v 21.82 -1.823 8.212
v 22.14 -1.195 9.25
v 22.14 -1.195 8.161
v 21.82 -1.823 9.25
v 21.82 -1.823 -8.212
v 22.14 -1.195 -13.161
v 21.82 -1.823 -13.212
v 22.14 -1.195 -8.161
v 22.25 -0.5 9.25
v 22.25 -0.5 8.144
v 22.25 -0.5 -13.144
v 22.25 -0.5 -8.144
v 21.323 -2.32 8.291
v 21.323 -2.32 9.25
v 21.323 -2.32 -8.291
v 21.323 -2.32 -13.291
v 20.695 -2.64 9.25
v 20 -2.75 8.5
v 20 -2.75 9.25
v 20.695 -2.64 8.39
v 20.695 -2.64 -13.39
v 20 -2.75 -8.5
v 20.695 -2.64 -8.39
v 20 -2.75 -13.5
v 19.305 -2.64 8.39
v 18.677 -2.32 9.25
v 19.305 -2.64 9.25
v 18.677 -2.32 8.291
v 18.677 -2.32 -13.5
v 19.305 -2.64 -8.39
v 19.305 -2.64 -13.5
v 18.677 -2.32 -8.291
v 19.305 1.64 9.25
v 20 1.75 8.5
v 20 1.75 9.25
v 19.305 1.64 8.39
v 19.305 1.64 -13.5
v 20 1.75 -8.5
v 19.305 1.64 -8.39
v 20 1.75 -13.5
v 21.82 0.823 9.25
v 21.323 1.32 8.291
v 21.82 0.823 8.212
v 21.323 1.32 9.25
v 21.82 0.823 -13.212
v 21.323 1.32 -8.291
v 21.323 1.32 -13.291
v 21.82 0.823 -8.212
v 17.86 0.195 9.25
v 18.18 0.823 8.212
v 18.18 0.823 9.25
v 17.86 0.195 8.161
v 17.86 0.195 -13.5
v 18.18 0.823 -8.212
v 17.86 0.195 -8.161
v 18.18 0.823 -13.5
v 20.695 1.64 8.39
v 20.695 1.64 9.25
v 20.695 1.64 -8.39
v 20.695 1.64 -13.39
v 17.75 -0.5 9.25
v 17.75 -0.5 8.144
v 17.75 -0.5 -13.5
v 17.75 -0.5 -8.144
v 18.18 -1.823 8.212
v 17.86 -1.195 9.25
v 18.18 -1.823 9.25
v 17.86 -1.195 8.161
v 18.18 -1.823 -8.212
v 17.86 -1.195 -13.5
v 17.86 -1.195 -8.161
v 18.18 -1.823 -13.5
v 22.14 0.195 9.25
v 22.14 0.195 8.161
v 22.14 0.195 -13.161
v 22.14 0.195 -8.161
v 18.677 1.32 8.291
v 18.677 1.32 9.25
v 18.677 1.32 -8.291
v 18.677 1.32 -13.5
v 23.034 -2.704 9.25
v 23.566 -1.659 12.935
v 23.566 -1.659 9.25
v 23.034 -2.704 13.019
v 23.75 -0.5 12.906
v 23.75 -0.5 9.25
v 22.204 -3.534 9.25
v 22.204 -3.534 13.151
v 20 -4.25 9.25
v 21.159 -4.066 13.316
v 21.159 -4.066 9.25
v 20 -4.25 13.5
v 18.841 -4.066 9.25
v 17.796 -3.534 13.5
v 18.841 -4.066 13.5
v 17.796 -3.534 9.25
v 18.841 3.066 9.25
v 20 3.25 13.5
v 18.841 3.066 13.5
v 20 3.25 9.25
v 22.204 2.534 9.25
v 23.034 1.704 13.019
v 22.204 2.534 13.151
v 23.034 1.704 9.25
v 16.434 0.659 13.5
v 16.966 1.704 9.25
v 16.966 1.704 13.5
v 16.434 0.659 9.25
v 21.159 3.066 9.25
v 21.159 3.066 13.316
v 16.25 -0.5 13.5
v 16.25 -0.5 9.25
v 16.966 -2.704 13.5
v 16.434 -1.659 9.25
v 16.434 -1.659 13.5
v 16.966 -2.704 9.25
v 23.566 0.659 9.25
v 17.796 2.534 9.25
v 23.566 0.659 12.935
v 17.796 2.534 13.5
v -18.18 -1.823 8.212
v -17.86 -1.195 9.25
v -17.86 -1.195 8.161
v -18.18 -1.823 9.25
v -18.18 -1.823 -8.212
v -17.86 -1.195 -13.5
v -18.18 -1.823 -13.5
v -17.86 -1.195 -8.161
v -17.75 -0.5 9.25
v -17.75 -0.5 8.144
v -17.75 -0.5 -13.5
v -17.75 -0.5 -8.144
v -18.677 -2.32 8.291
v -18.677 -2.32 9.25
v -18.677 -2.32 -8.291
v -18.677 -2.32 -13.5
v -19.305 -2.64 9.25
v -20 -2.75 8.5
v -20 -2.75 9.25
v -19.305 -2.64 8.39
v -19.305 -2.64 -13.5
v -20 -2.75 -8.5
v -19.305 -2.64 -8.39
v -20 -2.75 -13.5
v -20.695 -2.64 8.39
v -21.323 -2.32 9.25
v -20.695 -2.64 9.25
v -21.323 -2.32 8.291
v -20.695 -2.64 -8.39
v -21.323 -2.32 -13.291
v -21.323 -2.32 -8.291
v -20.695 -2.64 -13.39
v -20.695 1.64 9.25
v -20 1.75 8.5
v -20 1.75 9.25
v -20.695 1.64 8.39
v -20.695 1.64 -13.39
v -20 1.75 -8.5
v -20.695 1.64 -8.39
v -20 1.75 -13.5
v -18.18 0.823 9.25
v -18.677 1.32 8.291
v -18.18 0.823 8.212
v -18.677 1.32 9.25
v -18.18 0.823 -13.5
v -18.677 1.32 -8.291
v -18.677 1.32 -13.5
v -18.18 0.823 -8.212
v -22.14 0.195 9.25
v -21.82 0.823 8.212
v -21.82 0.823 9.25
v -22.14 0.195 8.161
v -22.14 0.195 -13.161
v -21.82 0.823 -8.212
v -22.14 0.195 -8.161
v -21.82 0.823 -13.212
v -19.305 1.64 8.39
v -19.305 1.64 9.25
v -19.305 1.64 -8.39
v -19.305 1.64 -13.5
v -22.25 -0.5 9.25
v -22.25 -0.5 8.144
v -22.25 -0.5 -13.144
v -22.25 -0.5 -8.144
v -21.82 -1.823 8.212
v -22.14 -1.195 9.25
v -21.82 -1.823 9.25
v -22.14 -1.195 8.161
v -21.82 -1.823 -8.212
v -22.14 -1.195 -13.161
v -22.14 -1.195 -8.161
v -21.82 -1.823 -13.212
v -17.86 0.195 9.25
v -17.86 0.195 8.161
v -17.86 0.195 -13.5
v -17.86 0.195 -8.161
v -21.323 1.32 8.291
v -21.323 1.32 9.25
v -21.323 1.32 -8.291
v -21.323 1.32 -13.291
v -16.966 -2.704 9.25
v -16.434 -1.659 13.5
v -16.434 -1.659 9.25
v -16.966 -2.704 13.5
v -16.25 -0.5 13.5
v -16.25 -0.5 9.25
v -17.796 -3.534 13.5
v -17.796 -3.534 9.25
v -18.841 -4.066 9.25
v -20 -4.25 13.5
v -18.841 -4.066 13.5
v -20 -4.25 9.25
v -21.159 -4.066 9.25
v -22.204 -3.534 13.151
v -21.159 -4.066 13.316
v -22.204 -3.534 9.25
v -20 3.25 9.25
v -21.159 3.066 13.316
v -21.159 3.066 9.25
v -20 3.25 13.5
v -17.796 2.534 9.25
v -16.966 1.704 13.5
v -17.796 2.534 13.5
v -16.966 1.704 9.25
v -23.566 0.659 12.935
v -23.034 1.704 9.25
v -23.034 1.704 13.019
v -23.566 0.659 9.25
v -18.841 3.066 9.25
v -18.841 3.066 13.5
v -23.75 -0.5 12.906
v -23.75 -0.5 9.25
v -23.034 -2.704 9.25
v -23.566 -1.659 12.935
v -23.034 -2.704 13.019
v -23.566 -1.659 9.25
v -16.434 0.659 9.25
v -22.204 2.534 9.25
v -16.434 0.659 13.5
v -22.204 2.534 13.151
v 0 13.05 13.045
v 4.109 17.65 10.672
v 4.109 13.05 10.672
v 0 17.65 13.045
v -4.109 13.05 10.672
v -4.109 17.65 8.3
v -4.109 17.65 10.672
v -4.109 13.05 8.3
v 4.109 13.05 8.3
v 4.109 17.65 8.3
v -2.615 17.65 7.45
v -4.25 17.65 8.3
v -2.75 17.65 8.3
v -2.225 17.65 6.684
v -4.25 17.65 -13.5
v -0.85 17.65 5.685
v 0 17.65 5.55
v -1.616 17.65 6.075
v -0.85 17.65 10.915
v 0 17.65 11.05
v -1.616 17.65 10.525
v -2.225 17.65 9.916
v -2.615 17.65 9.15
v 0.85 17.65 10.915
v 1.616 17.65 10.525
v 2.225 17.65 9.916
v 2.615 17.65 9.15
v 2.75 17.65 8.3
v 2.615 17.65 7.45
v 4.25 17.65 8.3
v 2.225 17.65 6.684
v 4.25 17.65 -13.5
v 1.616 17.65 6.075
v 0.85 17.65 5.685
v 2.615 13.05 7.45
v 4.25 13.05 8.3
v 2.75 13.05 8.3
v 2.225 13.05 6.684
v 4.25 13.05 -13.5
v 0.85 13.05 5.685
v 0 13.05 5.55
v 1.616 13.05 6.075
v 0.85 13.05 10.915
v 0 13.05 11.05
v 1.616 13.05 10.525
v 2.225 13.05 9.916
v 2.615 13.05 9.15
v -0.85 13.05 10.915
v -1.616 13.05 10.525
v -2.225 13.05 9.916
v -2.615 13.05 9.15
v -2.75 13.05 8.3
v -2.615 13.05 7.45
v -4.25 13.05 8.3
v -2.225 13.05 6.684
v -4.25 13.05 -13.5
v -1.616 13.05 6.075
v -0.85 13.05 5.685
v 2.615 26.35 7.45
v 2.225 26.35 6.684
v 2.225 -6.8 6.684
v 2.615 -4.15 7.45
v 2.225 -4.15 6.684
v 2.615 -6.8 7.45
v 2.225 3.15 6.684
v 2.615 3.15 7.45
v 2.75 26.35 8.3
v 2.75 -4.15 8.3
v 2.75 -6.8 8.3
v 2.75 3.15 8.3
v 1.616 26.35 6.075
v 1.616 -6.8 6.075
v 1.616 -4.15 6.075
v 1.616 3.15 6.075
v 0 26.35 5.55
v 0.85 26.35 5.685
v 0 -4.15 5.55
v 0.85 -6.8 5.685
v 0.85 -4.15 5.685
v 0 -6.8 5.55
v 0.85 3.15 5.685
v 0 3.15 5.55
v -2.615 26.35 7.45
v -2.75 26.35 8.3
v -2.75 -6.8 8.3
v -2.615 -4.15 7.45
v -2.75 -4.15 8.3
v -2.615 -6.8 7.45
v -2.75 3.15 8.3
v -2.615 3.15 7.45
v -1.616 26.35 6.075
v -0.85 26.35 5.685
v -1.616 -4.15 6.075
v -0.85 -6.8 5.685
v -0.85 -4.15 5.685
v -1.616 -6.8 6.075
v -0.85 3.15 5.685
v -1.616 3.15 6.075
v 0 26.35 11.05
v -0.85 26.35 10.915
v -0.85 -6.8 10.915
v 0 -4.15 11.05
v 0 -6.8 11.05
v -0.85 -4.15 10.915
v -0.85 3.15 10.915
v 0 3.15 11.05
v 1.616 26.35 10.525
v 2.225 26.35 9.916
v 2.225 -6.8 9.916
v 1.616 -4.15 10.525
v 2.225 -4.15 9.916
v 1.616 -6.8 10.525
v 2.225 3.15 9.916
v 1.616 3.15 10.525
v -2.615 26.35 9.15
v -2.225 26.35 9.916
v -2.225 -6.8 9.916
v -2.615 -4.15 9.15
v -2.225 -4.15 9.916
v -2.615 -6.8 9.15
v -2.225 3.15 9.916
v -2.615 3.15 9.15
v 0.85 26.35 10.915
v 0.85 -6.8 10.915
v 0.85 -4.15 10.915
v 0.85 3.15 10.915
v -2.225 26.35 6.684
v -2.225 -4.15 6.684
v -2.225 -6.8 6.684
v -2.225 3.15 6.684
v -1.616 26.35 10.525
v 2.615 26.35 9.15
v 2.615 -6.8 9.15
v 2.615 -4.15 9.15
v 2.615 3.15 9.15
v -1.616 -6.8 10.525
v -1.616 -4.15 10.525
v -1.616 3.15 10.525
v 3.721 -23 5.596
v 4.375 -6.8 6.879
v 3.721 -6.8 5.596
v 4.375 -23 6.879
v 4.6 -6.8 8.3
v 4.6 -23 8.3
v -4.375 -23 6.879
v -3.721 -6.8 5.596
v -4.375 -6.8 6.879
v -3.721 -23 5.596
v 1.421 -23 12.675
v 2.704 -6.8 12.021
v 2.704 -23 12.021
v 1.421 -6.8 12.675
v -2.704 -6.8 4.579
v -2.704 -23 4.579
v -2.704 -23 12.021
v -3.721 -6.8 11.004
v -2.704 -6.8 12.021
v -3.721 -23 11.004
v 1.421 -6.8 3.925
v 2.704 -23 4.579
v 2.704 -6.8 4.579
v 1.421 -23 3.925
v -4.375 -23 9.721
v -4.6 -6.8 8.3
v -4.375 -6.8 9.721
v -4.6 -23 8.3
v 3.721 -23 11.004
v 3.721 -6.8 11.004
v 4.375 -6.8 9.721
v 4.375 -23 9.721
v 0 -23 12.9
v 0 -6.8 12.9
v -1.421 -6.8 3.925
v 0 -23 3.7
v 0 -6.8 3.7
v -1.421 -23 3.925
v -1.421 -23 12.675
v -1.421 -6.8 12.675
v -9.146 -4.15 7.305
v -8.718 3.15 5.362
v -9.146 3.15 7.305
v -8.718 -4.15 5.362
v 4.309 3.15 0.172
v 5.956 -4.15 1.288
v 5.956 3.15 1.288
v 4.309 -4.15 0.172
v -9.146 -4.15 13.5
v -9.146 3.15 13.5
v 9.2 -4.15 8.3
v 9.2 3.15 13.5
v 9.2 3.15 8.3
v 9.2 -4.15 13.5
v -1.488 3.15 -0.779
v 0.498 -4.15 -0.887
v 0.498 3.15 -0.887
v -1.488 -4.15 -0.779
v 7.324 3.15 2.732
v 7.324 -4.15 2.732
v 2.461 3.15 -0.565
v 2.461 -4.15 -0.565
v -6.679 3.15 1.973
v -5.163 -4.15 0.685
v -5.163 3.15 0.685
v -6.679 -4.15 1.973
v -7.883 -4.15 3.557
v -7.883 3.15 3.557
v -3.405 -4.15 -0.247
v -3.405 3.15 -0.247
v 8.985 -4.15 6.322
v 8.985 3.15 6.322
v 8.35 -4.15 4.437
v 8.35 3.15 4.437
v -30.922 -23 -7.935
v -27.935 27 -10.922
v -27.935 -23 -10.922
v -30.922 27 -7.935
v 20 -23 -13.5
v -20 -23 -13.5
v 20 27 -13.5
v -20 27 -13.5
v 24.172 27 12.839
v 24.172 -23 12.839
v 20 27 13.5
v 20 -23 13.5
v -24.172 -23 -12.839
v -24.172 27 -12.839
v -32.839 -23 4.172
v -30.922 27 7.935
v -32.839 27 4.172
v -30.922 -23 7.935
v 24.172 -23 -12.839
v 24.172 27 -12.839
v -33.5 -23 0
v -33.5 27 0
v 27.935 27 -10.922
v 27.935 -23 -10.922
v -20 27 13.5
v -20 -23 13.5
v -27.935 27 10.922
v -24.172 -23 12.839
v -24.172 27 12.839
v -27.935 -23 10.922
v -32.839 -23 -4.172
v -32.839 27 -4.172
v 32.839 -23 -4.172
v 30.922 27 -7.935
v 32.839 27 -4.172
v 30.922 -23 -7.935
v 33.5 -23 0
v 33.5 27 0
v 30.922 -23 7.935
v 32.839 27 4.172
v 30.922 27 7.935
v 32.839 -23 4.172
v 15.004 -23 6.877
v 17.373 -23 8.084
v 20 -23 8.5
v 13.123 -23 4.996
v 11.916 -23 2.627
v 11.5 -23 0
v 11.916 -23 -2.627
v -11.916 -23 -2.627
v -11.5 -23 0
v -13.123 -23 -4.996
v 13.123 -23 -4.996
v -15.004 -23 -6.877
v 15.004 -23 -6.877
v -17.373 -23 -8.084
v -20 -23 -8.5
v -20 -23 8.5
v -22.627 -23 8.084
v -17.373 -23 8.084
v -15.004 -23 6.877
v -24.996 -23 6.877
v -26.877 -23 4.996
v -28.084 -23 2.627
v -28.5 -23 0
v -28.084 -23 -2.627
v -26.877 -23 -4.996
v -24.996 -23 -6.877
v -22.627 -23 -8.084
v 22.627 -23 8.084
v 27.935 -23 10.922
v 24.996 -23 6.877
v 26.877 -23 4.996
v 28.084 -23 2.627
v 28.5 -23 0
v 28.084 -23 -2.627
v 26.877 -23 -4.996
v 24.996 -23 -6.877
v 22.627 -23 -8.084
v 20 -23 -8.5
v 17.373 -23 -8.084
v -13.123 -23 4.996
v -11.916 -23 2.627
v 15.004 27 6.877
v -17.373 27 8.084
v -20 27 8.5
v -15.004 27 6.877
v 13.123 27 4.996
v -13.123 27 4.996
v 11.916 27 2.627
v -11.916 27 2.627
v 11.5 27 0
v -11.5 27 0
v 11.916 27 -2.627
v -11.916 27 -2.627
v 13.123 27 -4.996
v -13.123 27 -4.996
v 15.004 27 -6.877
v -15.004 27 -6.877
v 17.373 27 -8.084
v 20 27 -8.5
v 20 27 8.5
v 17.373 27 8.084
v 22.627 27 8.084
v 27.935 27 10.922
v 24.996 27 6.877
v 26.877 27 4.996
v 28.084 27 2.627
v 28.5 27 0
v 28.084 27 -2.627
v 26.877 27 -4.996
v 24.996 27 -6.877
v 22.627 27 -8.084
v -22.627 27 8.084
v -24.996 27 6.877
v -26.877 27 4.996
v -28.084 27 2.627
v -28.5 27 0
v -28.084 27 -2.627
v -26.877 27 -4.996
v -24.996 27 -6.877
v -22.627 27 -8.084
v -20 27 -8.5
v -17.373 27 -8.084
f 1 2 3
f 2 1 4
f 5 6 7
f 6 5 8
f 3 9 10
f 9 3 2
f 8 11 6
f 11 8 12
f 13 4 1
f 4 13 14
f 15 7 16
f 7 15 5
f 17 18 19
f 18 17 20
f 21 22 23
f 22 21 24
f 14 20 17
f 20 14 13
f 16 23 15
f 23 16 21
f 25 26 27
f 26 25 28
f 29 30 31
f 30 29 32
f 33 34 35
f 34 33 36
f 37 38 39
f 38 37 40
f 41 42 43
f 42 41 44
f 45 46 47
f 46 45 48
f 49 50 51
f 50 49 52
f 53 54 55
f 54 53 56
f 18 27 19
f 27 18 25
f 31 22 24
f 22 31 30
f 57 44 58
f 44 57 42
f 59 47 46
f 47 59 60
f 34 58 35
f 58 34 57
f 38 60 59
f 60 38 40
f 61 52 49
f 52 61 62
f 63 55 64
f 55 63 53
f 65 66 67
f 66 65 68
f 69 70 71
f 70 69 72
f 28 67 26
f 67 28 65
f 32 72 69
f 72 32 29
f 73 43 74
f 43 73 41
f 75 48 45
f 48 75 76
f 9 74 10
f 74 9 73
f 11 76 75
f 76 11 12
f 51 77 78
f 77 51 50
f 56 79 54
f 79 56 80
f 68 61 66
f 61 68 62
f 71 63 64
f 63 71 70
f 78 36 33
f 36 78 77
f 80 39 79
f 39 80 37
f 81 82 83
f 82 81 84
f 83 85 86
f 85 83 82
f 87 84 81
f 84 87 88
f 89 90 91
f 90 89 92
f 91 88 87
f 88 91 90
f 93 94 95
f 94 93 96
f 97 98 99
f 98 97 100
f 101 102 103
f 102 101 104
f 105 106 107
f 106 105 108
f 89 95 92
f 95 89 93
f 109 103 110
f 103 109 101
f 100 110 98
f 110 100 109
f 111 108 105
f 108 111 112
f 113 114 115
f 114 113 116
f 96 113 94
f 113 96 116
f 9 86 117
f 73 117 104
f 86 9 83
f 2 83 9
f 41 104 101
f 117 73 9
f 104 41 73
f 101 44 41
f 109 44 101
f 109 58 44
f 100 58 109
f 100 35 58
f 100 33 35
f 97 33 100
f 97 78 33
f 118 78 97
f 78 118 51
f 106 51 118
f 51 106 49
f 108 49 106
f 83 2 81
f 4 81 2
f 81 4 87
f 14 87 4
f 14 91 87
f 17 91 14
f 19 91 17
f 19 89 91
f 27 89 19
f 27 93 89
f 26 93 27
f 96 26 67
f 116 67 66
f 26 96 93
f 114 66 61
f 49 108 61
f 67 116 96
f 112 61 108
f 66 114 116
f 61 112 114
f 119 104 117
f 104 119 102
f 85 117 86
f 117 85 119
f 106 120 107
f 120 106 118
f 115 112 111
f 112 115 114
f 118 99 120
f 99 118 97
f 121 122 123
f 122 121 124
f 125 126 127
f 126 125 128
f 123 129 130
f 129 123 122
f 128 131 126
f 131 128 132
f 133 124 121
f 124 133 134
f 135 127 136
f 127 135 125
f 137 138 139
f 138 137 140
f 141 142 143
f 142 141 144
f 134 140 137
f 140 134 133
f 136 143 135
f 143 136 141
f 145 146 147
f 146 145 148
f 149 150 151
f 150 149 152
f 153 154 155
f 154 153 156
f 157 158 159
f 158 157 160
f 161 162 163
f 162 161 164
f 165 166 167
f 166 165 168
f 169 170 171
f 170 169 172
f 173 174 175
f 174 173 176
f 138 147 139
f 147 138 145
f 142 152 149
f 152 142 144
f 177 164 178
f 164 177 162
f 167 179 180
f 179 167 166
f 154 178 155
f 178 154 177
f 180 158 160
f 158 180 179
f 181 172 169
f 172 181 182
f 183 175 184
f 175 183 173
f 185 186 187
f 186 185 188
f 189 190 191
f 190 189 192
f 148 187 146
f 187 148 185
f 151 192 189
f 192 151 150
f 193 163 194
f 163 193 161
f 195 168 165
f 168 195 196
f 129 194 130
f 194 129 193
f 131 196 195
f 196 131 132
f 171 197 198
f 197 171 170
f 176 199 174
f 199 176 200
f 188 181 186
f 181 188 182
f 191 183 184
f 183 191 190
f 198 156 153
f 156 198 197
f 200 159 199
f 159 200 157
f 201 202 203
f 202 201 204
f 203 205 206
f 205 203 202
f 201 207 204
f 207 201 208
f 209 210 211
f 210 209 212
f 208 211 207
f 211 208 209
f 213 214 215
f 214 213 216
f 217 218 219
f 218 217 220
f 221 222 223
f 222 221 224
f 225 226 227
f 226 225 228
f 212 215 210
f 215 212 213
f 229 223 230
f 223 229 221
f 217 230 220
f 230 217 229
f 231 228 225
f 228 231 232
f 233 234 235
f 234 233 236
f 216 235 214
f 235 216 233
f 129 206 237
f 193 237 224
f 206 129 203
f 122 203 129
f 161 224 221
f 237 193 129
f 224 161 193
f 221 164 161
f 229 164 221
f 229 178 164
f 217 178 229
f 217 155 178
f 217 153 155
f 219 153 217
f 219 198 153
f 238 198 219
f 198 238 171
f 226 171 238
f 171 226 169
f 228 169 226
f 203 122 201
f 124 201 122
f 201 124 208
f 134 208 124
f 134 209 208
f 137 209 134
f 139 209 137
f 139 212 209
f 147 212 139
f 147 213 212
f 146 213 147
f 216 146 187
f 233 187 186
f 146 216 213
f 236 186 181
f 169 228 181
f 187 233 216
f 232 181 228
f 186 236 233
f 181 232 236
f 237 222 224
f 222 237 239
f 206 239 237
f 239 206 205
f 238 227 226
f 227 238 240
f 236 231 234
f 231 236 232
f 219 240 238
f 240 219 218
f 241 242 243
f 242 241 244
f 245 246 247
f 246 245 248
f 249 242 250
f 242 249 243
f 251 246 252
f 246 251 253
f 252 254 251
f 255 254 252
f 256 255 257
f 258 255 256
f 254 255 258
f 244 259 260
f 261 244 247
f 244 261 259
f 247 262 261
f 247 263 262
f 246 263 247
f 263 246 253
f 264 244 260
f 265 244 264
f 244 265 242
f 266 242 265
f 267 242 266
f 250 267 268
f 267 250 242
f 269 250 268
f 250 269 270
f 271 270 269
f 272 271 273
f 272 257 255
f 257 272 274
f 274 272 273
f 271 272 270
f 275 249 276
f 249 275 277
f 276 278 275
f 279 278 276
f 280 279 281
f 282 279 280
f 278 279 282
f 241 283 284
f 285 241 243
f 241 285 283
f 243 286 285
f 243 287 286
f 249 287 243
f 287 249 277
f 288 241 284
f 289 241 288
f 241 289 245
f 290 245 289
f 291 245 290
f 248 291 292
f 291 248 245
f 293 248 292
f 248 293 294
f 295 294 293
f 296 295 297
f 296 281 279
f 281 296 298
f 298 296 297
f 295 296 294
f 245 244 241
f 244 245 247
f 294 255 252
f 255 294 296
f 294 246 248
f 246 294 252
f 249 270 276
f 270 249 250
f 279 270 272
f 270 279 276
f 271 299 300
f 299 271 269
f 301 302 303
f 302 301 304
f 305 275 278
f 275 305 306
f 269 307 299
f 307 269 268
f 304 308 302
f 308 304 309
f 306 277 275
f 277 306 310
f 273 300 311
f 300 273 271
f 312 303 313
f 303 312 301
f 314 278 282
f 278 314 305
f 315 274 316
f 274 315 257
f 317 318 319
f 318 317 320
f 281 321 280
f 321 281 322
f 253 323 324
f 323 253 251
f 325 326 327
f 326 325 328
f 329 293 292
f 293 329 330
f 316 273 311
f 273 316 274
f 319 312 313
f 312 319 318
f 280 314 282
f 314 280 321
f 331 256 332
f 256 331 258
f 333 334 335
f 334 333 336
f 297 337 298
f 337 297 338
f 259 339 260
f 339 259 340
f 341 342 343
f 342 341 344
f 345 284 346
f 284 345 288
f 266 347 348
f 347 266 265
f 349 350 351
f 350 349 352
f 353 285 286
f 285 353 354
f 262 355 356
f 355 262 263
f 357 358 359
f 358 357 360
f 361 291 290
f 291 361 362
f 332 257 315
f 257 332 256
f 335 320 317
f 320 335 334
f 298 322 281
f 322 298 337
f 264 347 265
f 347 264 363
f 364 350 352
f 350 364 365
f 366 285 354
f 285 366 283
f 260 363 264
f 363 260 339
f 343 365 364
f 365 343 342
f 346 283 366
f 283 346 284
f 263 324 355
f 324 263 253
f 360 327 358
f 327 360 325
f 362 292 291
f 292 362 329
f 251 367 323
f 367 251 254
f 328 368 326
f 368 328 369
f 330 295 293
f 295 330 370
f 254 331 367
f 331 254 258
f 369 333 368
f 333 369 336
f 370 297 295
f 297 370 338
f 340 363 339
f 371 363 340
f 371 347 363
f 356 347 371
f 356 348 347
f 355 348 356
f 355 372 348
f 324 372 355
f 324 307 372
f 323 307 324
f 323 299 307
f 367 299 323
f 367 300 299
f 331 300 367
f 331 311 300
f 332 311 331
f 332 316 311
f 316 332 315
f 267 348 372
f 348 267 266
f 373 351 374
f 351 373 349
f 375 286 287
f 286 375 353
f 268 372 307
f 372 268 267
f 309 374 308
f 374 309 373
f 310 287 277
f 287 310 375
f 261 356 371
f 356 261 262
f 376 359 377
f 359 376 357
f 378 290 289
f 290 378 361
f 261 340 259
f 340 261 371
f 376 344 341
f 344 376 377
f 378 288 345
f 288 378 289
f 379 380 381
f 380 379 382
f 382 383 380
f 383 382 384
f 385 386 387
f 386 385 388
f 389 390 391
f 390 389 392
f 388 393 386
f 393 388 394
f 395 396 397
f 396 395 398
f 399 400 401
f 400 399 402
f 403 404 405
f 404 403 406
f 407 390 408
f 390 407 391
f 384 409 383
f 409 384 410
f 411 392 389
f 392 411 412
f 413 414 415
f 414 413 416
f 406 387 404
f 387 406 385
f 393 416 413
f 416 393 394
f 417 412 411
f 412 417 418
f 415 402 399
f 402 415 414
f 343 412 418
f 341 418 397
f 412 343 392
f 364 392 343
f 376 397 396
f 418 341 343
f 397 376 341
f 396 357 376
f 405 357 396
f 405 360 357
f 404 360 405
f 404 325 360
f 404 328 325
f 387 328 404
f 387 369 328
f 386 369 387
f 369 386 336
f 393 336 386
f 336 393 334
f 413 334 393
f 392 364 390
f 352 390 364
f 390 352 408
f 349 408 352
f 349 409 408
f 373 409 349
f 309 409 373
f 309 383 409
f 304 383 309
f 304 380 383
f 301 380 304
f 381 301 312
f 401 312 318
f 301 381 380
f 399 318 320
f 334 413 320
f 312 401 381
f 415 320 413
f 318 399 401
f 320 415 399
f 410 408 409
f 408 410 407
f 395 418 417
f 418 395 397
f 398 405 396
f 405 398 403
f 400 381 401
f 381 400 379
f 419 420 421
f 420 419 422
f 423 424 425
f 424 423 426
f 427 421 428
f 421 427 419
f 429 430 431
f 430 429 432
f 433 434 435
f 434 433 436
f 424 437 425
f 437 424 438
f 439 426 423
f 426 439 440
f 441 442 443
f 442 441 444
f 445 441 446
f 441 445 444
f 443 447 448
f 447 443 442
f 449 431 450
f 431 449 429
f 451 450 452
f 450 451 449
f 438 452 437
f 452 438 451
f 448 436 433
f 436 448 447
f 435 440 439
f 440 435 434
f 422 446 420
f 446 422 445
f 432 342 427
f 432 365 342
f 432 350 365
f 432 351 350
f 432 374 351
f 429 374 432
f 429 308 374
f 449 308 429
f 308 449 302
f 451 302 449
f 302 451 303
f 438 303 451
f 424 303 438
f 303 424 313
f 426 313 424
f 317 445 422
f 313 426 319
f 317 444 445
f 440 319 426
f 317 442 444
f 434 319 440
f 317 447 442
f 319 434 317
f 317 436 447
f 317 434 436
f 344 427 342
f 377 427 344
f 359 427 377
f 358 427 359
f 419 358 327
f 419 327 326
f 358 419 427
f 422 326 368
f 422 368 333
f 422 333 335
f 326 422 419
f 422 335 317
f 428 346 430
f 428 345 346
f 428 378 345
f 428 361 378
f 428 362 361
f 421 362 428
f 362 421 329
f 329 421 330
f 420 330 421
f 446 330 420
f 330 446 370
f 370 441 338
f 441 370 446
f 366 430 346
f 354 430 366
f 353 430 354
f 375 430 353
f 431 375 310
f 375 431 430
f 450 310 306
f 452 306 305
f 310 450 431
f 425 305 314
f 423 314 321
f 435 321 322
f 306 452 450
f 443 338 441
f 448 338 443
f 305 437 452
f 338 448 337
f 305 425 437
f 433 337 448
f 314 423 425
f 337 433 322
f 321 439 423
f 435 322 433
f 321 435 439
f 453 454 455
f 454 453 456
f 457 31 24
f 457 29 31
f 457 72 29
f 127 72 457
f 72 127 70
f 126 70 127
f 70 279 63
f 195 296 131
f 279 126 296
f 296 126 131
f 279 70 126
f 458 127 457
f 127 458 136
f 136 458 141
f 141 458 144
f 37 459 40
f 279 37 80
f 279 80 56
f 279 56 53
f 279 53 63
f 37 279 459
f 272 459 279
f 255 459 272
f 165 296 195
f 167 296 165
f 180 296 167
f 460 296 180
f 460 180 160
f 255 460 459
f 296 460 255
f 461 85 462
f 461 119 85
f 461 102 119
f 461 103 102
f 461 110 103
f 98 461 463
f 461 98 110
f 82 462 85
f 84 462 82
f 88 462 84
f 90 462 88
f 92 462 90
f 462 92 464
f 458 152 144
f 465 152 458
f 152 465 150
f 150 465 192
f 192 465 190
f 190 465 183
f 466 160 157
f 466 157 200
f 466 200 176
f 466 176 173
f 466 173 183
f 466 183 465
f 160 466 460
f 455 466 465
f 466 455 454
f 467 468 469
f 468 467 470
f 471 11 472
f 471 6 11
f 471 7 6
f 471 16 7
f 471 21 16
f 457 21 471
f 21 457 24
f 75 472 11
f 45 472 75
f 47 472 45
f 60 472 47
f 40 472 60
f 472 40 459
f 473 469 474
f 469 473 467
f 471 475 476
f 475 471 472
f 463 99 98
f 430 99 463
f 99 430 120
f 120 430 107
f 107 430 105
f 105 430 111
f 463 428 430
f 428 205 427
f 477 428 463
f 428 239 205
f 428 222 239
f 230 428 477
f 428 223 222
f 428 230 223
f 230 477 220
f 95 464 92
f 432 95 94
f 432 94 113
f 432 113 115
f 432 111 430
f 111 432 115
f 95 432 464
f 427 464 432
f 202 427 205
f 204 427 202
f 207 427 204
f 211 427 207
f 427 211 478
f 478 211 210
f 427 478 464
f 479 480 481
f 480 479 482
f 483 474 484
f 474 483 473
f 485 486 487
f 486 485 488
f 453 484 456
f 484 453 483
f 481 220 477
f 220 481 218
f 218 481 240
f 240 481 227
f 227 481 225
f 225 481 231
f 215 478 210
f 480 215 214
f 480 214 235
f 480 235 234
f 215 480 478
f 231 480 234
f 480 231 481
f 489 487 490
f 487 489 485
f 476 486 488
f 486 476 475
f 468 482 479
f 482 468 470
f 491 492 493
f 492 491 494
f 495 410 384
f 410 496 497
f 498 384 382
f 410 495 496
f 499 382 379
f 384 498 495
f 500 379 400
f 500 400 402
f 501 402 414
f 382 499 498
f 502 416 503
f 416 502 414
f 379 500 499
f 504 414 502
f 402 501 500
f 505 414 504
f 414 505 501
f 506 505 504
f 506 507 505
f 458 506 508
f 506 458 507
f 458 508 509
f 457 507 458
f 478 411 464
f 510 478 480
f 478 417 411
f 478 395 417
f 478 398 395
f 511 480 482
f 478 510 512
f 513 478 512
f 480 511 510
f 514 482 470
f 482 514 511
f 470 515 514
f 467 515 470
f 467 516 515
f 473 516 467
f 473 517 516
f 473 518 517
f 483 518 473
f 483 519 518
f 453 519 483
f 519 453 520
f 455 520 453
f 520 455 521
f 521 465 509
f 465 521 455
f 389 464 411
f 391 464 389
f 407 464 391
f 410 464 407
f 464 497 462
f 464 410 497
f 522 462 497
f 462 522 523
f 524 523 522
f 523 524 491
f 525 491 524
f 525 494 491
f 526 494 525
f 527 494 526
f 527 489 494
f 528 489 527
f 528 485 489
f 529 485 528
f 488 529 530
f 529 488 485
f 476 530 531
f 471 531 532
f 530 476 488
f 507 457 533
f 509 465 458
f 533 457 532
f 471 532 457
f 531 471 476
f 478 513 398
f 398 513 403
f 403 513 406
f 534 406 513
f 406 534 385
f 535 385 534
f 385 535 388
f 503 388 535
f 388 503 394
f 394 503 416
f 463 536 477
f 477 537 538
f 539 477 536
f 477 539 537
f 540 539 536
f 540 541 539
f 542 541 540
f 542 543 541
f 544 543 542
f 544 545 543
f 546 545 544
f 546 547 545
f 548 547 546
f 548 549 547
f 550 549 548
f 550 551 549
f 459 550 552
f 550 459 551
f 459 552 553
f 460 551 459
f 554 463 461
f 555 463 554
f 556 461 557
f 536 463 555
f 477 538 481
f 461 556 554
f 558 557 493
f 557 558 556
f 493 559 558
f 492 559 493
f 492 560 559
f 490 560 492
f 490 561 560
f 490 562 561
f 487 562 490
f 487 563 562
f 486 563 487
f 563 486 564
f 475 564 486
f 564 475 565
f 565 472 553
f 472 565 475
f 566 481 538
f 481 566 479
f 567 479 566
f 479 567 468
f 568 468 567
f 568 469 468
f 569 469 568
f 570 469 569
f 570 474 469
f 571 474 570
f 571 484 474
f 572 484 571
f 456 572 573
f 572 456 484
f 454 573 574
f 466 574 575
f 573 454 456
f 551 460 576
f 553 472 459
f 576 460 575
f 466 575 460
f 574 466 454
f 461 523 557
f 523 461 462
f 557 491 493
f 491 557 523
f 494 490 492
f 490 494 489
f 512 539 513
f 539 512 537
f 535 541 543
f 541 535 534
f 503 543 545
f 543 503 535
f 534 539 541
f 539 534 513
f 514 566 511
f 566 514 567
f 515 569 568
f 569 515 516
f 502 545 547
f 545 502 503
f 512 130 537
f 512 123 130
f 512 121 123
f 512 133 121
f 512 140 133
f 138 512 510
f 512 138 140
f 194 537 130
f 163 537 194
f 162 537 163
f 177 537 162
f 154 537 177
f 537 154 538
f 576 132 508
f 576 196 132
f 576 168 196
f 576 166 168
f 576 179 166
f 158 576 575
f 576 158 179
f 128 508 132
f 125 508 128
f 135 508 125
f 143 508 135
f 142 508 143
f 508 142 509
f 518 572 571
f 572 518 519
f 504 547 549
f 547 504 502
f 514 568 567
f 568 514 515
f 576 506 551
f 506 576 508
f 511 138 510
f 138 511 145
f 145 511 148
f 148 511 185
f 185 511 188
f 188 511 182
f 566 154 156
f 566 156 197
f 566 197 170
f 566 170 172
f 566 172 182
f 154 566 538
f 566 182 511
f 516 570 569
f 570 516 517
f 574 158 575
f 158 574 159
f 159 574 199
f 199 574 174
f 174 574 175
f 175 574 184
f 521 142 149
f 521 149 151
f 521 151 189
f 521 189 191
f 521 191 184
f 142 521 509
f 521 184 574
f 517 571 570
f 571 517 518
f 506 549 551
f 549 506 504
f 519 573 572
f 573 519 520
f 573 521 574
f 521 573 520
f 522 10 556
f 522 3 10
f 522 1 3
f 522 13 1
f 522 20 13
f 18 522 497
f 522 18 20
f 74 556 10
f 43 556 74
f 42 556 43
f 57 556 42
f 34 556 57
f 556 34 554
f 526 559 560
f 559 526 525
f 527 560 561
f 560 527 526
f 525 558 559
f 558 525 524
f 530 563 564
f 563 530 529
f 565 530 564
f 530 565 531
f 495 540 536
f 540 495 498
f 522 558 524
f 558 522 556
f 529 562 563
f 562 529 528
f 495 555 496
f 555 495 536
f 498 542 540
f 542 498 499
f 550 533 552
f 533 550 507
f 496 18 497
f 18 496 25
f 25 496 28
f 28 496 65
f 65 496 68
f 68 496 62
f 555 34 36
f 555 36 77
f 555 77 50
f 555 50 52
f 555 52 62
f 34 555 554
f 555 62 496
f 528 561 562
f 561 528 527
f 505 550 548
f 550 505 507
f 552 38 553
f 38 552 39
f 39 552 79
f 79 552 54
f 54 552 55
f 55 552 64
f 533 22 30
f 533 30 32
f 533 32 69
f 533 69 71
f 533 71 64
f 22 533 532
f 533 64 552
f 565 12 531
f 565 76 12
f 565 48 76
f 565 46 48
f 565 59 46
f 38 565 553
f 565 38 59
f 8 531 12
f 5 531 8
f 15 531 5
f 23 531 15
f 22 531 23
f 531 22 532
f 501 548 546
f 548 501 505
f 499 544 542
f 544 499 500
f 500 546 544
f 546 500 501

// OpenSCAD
translate(v = [0, 27.0000000000, 0]) {
	rotate(a = [90, 0, 0]) {
		difference() {
			hull() {
				union() {
					translate(v = [-20.0000000000, 0, 0]) {
						cylinder($fn = 20, d = 27.0000000000, h = 50);
					}
					translate(v = [20.0000000000, 0, 0]) {
						cylinder($fn = 20, d = 27.0000000000, h = 50);
					}
				}
			}
			translate(v = [-20.0000000000, 0, -0.0500000000]) {
				cylinder($fn = 20, d = 17.0000000000, h = 50.1000000000);
			}
			translate(v = [20.0000000000, 0, -0.0500000000]) {
				cylinder($fn = 20, d = 17.0000000000, h = 50.1000000000);
			}
			translate(v = [20.0000000000, 13.5000000000, 27.5000000000]) {
				rotate(a = [90, 0, 0]) {
					translate(v = [0, 0, 4.2000000000]) {
						union() {
							translate(v = [0, 0, false]) {
								cylinder($fn = 20, d = 4.5000000000, h = 49.2000000000);
							}
							translate(v = [0, 0, -14.1500000000]) {
								cylinder($fn = 20, d = 7.5000000000, h = 14.2000000000);
							}
							translate(v = [0, 0, 31]) {
								cylinder($fn = 6, d = 8.1600000000, h = 10);
							}
						}
					}
				}
			}
			translate(v = [-20.0000000000, 13.5000000000, 27.5000000000]) {
				rotate(a = [90, 0, 0]) {
					translate(v = [0, 0, 4.2000000000]) {
						union() {
							translate(v = [0, 0, false]) {
								cylinder($fn = 20, d = 4.5000000000, h = 49.2000000000);
							}
							translate(v = [0, 0, -14.1500000000]) {
								cylinder($fn = 20, d = 7.5000000000, h = 14.2000000000);
							}
							translate(v = [0, 0, 31]) {
								cylinder($fn = 6, d = 8.1600000000, h = 10);
							}
						}
					}
				}
			}
			translate(v = [0, 8.3000000000, 23.8500000000]) {
				hull() {
					cylinder(d = 18.4000000000, h = 7.3000000000);
					translate(v = [0, 16.4000000000, 0]) {
						cylinder(d = 18.4000000000, h = 7.3000000000);
					}
				}
				rotate(a = [180, 0, 0]) {
					translate(v = [0, 0, -10.0000000000]) {
						union() {
							translate(v = [0, 0, false]) {
								cylinder($fn = 20, d = 5.5000000000, h = 33.2000000000);
							}
							translate(v = [0, 0, -55.1500000000]) {
								cylinder($fn = 20, d = 9.2000000000, h = 55.2000000000);
							}
							translate(v = [0, 0, 19.9000000000]) {
								rotate(a = [90, 0, 180]) {
									union() {
										rotate(a = [-90, 90, 0]) {
											cylinder($fn = 6, d = 9.4900000000, h = 4.6000000000);
										}
										translate(v = [-4.2500000000, 0, 0]) {
											cube(size = [8.5000000000, 4.6000000000, 100]);
										}
									}
								}
							}
						}
					}
				}
			}
		}
	}
}
/***********************************************
*********      SolidPython code:      **********
************************************************
 
import os
cq = 20

render = False
os.environ["PRINTEDSCOPE_QUALITY"] = str(cq)

from lib.model_parameters import *
from solid import *
from solid.utils import *
import numpy as np


g1p1_bearing = bearing_625
g1g1_space = 3 # jak velka bude mezera mezi zakladnou na zemi a AZ sestavou
g1p1_pipe_center_distance = 7 # jak daleko konci trubka od stredu
g1_pipe_in = 40
g1p1_diameter = 65
g1_foot_height = 60
g1_pipe_bolt = M4
g1_pipe_bolt['l'] = 35


g1_foot_length = 100
g1_foot_width = 50
g1_pipe_distance = 40
g1_pipe = pipe_16_2
g1_pipe['min_wall'] = 5
g1p4_wall = 2

g1_foot_bridge_height = 10
g1_foot_bridge_length =  g1_foot_length-50

#g1_foot_length = g1_pipe_distance+g1_pipe['D']+2*g1_pipe['min_wall']

# kostka, na ktere to lezi na zemi...
g1p2_width = 50
g1p2_length = 100
g1p2_height = g1_foot_height

def s111g1p01():
    pipe_bolt = g1_pipe_bolt
    pipe_height = pipe_bolt['l']
    pipe_height += pipe_bolt['k']
    #bottom = -(pipe_height-g1_pipe['min_wall']-g1_pipe['D']/2)-clear

    g1p1_cube_length = 65
    g1p1_base_height = 35+3

    bottom = -(g1p1_base_height/2)-clear

    #zakladni valec s kostkami pro trubky
    m= cylinder(h=g1p1_base_height, d=115, segments=cq)
    for x in range(3):
        m+= rotate([0, 0, 360/3*x])(
            translate([0, -(g1_pipe['D']+g1_pipe_distance+4*g1_pipe['min_wall'])/2,0])(
                cube([g1p1_cube_length, g1_pipe['D']+g1_pipe_distance+4*g1_pipe['min_wall'], g1p1_base_height])
            )
        )
    m = down(g1p1_base_height/2)(m)
    #m = hull()(m)

    m+= up(g1p1_base_height/2-1.1)(
            difference()(
                cylinder(h=5, d=80, segments=cq),
                down(clear/2)(cylinder(h=10+clear, d=80-3, segments=cq))
            )
        )
    
    m-=(up(g1p1_base_height/2-g1_pipe['min_wall']+1)(cylinder(h=5+clear, d1=80-3-5, d2=80-3, segments=cq)))


    for x in range(3):
        m-= rotate([0, 90, 360/3*x])(
            # diry pro zastrceni trubky
            translate([0, -g1_pipe_distance/2, g1p1_pipe_center_distance])(
                cylinder(d= base_pipe['D'], h=100, segments=cq)
            ),
            translate([0, g1_pipe_distance/2, g1p1_pipe_center_distance])(
                cylinder(d= base_pipe['D'], h=100, segments=cq)
            ),
            # diry pro srouby skrz trubky
                translate([2, -g1_pipe_distance/2, g1p1_diameter*0.75])(
                rotate([0, -90, 0])(
                    bolt_hole(pipe_bolt, nut=-3, align='center')
                )
            ),
            translate([2, g1_pipe_distance/2, g1p1_diameter*0.75])(
                rotate([0, -90, 0])(
                    (bolt_hole(pipe_bolt, nut=-3, align='center'))
                )
            ),

            # otvor pro srouby pro pridelani lozisek
            translate([0, 0, (g1p1_bearing['D'])])(
                left(bottom+g1p1_base_height-2-M3['k']-g1p1_bearing['B'])(
                    rotate([0, 180, 90])(
                        nut_pocket(pipe_bolt, g1p1_bearing['D'])
                    )
                ),
                left(bottom-1+M3['m']+g1p1_bearing['B'])(
                    rotate([0, 180, 90])(
                        nut_pocket(pipe_bolt, g1p1_bearing['D'])
                    )
                ),
                left(bottom+105+layer*1.5)(rotate([0, 90, 0])(
                    cylinder(d=M3['d'], h=100, segments=cq)
                ))
            )
        )

    # dira pro vyvedeni kabelu
    m -= translate([20, g1_pipe_distance/2, bottom+g1p1_base_height/2+clear])(
            cylinder(d=8, h=g1p1_base_height+clear)
        )
    m -= translate([20, -g1_pipe_distance/2, bottom+g1p1_base_height/2+clear])(
            cylinder(d=8, h=g1p1_base_height+clear)
        )

    # diry skrz pro loziska a sroub M5 a osazeni pro pridelani loziska
    m -= up(bottom)(
            cylinder(d=g1p1_bearing['D']+4*M3['dk']+1, h=M3['k']+2)
        )
    m -= up(bottom+M3['k']+2+layer*1)(
            debug(cylinder(d=g1p1_bearing['D'], h=g1p1_bearing['B'], segments=cq)) # Lozisko spodni
        )
    m -= up(bottom+M3['k']+2+layer*2+g1p1_bearing['B'])(
            cylinder(d=g1p1_bearing['D']-4, h=50, segments=cq)
        )
    m -= up(bottom+g1p1_base_height-M3['k']-2- g1p1_bearing['B'])(
            debug(cylinder(d=g1p1_bearing['D'], h=g1p1_bearing['B'], segments=cq))  # Lozisko horni
        )
    m -= up(bottom+g1p1_base_height-M3['k']-2-clear)(
            cylinder(d=g1p1_bearing['D']+4*M3['dk']+1, h=50)
        )

    return m


def s111g1d01():
    pipe_bolt = g1_pipe_bolt
    pipe_height = pipe_bolt['l']
    pipe_height += pipe_bolt['k']
    #bottom = -(pipe_height-g1_pipe['min_wall']-g1_pipe['D']/2)-clear

    g1p1_cube_length = 65
    g1p1_base_height = 25+3

    bottom = -(g1p1_base_height/2)-clear

    #zakladni valec s kostkami pro trubky
    m= cylinder(h=g1p1_base_height, d=0, segments=cq)
    for x in range(1):
        m+= rotate([0, 0, 360/3*x])(
            translate([0, -(g1_pipe['D']+g1_pipe_distance+4*g1_pipe['min_wall'])/2,0])(
                cube([g1p1_cube_length, g1_pipe['D']+g1_pipe_distance+4*g1_pipe['min_wall'], g1p1_base_height])
            )
        )
    m = down(g1p1_base_height/2)(m)
    #m = hull()(m)

    m-= debug(rotate([0,0,60])(translate([0,-1, -base_pipe['D']/2])(cube([200, 2, 100]))))
    m-= debug(rotate([0,0,-60])(translate([0,-1, -base_pipe['D']/2])(cube([200, 2, 100]))))
    #m-= debug(rotate([0,0,-90-60])(down(50)(cube(200))))


    for x in range(1):
        m-= rotate([0, 90, 360/3*x])(
            # diry pro zastrceni trubky
            translate([0, -g1_pipe_distance/2, g1p1_pipe_center_distance])(
                cylinder(d= base_pipe['D'], h=100, segments=cq)
            ),
            translate([0, g1_pipe_distance/2, g1p1_pipe_center_distance])(
                cylinder(d= base_pipe['D'], h=100, segments=cq)
            ),
            # diry pro srouby skrz trubky
                translate([2, -g1_pipe_distance/2, g1p1_diameter*0.75])(
                rotate([0, -90, 0])(
                    bolt_hole(pipe_bolt, nut=-3, align='center', l=25)
                )
            ),
            translate([2, g1_pipe_distance/2, g1p1_diameter*0.75])(
                rotate([0, -90, 0])(
                    (bolt_hole(pipe_bolt, nut=-3, align='center', l=25))
                )
            ),

        )



    return m



def s111g1p02():
    m = cylinder(d=g1p1_bearing['D']+4*M3['dk'], h=M3['k']+2)
    m-= down(clear/2)(cylinder(d=g1p1_bearing['bolt']['dk']+1, h=M3['k']+2+clear))
    for x in range(3):
        m-=rotate([180, 0, 360/3*x])(
            translate([-g1p1_bearing['D'], 0, -M3['k']])(
                bolt_hole(M3, l=30)
            )
        )

    return m

def s111g1p03():
    m = cylinder(d=g1p1_bearing['D']+4*M3['dk'], h=M3['k']+2)
    m-= down(clear/2)(cylinder(h=3, d=25))
    m-= down(clear/2)(cylinder(d=g1p1_bearing['D']-3, h=M3['k']+2+clear))
    for x in range(3):
        m-=rotate([180, 0, 360/3*x])(
            translate([-g1p1_bearing['D'], 0, -M3['k']])(
                bolt_hole(M3, l=30)
            )
        )

    return m

def s111g1p04(blind = True):

    ## zakladni tvar nohy
    m = left(g1_pipe_distance/2)(
            cylinder(h=g1_foot_width, d=g1_pipe['D']+g1_pipe['min_wall']*2, segments=cq)
        )
    m += right(g1_pipe_distance/2)(
            cylinder(h=g1_foot_width, d=g1_pipe['D']+g1_pipe['min_wall']*2, segments=cq)
        )
    m += translate([-g1_foot_length/2, -g1_foot_height, 0])(
            cube([g1_foot_length, 5, g1_foot_width])
        )
    m = hull()(m)


    ## odebrani premosteni (spodni oblouk)
    r = left(g1_foot_bridge_length/2)(
            cylinder(h=g1_foot_width+clear, d=g1_pipe['D'], segments=cq)
        )
    r += right(g1_foot_bridge_length/2)(
            cylinder(h=g1_foot_width+clear, d=g1_pipe['D'], segments=cq)
        )
    r += translate([-(g1_foot_bridge_length+g1_pipe['D'])/2, -g1_foot_bridge_height, 0])(
            cube([(g1_foot_bridge_length+g1_pipe['D']), 5, g1_foot_width+clear])
        )
    r = hull()(translate([0, -g1_foot_height+g1_foot_bridge_height-clear, -clear/2])(r))
    m-=r


    ## odebrani diry pro elektroniku
    r = translate([-g1_pipe_distance/2, -g1p2_height, g1p4_wall])(
            cube([g1_pipe_distance, g1p2_height, g1_foot_width-2*g1p4_wall])
        )
    r += translate([-g1_pipe_distance/2-M3['dk']*1, -g1p2_height, g1p4_wall])(
            cube([g1_pipe_distance+M3['dk']*2, g1_foot_bridge_height+base_pipe['D']/2+5, g1_foot_width-2*g1p4_wall])
        )
    
    r -= left(g1_pipe_distance/2)(
            cylinder(h=g1_foot_width, d=g1_pipe['D']+2.5*g1_pipe['min_wall'])
        )
    r -= right(g1_pipe_distance/2)(
            cylinder(h=g1_foot_width, d=g1_pipe['D']+2.5*g1_pipe['min_wall'])
        )
    m-=(r)


    ## Srouby pro pridelani spodniho vicka
    m-= (union()(
            translate([g1_foot_width/2-2, -g1_pipe_distance+1, g1_foot_length/2-10])(
                bolt_hole(M3, l=5, nut=5, nut_type='nut_pocket', rotation=[1,0,0], nut_rotation=-90, pocket_length=10)
            ),
            translate([g1_foot_width/2-2, -g1_pipe_distance+1 , 10])(
                bolt_hole(M3, l=5, nut=5, nut_type='nut_pocket', rotation=[1,0,0], nut_rotation=-90, pocket_length=10)
            ),
            translate([-g1_foot_width/2+2, -g1_pipe_distance+1, 10])(
                bolt_hole(M3, l=5, nut=5, nut_type='nut_pocket', rotation=[1,0,0], nut_rotation=90, pocket_length=10)
            ),
            translate([-g1_foot_width/2+2, -g1_pipe_distance+1, g1_foot_length/2-10])(
                bolt_hole(M3, l=5, nut=5, nut_type='nut_pocket', rotation=[1,0,0], nut_rotation=90, pocket_length=10)
            )
        ))



    ## diry na trubky a srouby skrz trubky
    m -= translate([-g1_pipe_distance/2, 0, 2])(
            cylinder(h=g1_foot_width, d=g1_pipe['D'], segments=cq)
        )
    m -= translate([g1_pipe_distance/2, 0,2])(
            cylinder(h=g1_foot_width, d=g1_pipe['D'], segments=cq)
        )
    m -= translate([g1_pipe_distance/2, g1_pipe['D']/2+g1_pipe['min_wall'], 2+g1p1_diameter*0.5-g1p1_pipe_center_distance])(
            bolt_hole(M4, align='head', rotation=np.array([-1,0,0]), nut=-4, l=25, overlap=6)
            )
    m -=translate([-g1_pipe_distance/2, g1_pipe['D']/2+g1_pipe['min_wall'], 2+g1p1_diameter*0.5-g1p1_pipe_center_distance])(
            bolt_hole(M4, align='head', rotation=np.array([-1,0,0]), nut=-4, l=25, overlap=6)
        )

    m-= translate([0, g1_pipe['D']/2+g1_pipe['min_wall']-g1p1_bearing['D']/2+g1g1_space, g1_foot_width/2+2-g1p1_bearing['B']/2])(
            hull()(
                cylinder(d=g1p1_bearing['D']+2, h=g1p1_bearing['B']+2),
                forward(g1p1_bearing['D'])(cylinder(d=g1p1_bearing['D']+2, h=g1p1_bearing['B']+2))
            ),
            bolt_hole(M5, l=20, overlap =8, head_overlap=50, align='center', nut = -0.1, nut_type='nut_pocket', nut_rotation=180)
        )

    if blind:
        m+= translate([-5, 0, 0])(cube([10, layer*4, g1_foot_width]))
        m+= translate([-10, -layer*4+g1_pipe['D']/2+g1_pipe['min_wall'], 0])(cube([20, layer*4, g1_foot_width]))
        m+= translate([-10, 0, g1_foot_width-layer*4])(cube([20, g1_pipe['D']/2+g1_pipe['min_wall'], layer*4]))

    return forward(g1_foot_width/2+2)(rotate([90, 0, 0])(m))

def s111g1p05():
    m = s111g1p04()

    # 12V konektor
    m -= debug(translate([15,g1p2_height/2-3+layer ,-23])(rotate([90,0,0])(cylinder(h=2, d=el_connector_12v_panel['d'], segments=cq))))
    # LED 3mm
    #m -= debug(translate([10,g1p2_height/2-2+layer ,-10])(rotate([90,0,0])(cylinder(h=2, d=3.3))))
    # Kulaty vypinac 20.6mm, KWS 140RE
    m -= debug(translate([-5,g1p2_height/2-3+layer ,-23])(rotate([90,0,0])(cylinder(h=2, d=20.6+0.5, segments=cq))))

    m -= (translate([-g1p2_width/2+12,g1p2_height/2-10 ,-20])(rotate([0,-20,0])(cylinder(h=20, d=10))))
    m -= (translate([g1p2_width/2-12,g1p2_height/2-10 ,-20])(rotate([0,20,0])(cylinder(h=20, d=10))))
    
    return m

def s111g1p06():

    ## zakladni tvar nohy
    m = left(g1_pipe_distance/2)(
            cylinder(h=g1_foot_width, d=g1_pipe['D']+g1_pipe['min_wall']*2, segments=cq)
        )
    m += right(g1_pipe_distance/2)(
            cylinder(h=g1_foot_width, d=g1_pipe['D']+g1_pipe['min_wall']*2, segments=cq)
        )
    m = hull()(m)

    ## diry na trubky a srouby skrz trubky
    m -= translate([-g1_pipe_distance/2, 0, -clear])(
            cylinder(h=g1_foot_width+2*clear, d=g1_pipe['D'], segments=cq)
        )
    m -= translate([g1_pipe_distance/2, 0, -clear])(
            cylinder(h=g1_foot_width+2*clear, d=g1_pipe['D'], segments=cq)
        )
    m -= translate([g1_pipe_distance/2, g1_pipe['D']/2+g1_pipe['min_wall'], 2+g1p1_diameter*0.5-g1p1_pipe_center_distance])(
            bolt_hole(M4, align='head', rotation=np.array([-1,0,0]), nut=-4)
            )
    m -=translate([-g1_pipe_distance/2, g1_pipe['D']/2+g1_pipe['min_wall'], 2+g1p1_diameter*0.5-g1p1_pipe_center_distance])(
            bolt_hole(M4, align='head', rotation=np.array([-1,0,0]), nut=-4)
        )

    m-= translate([0, g1_pipe['D']/2+g1_pipe['min_wall']-g1p1_bearing['D']/2+g1g1_space, g1_foot_width/2+1.5-g1p1_bearing['B']/2])(
            hull()(
                cylinder(d=g1p1_bearing['D']+2, h=g1p1_bearing['B']+2),
                forward(g1p1_bearing['D'])(cylinder(d=g1p1_bearing['D']+2, h=g1p1_bearing['B']+2))
            ),
            bolt_hole(M5, l=20, overlap =8, head_overlap=50, align='center', nut = -0.1, nut_type='nut_pocket', nut_rotation=180)
        )

    return forward(g1_foot_width/2+2)(rotate([90, 0, 0])(m))


def s111g1p07():
    m = up(5/2)(cube([g1_pipe_distance+M3['dk']*2, g1_foot_bridge_height+base_pipe['D']/2+5, 5], center=True))
    for x in [-10, 10]:
        for y in [-5, 5]:
            m-=translate([x,y,0])(cylinder(d=M3['d'], h=10, segments=cq))
            m-=translate([x,y,2+clear])(cylinder(d=M3['dk'], h=3, segments=cq))
    return m





def s111g1_info():
    print("\nInformace o dilech 111_10**.scad")
    print("===============================")
    print("Staticka zakladna dalekohledu")
    print("Skrz trubky je sroub", g1_pipe_bolt)
    print("Stredy trubek jsou vzdaleny", g1_pipe_distance)
    print("AL tyce o D: {} mm, delka: {} mm, {}ks".format(base_pipe['D'], g2_octangle_do/2+g1p2_width/2-2-g1p1_pipe_center_distance, 6))


scad_render_to_file(s111g1p01(), '../scad/111_1001.scad')
scad_render_to_file(s111g1d01(), '../scad/111_1301.scad')
scad_render_to_file(s111g1p02(), '../scad/111_1002.scad')
scad_render_to_file(s111g1p03(), '../scad/111_1003.scad')
scad_render_to_file(s111g1p04(), '../scad/111_1004.scad')
scad_render_to_file(s111g1p05(), '../scad/111_1005.scad')
scad_render_to_file(s111g1p06(), '../scad/111_1006.scad')
scad_render_to_file(s111g1p07(), '../scad/111_1007.scad')

render = False
if render:
    cq = 150
    generate(s111g1p01(), '111_1001')
    generate(s111g1d01(), '111_1301')
    generate(s111g1p02(), '111_1002')
    generate(s111g1p03(), '111_1003')
    generate(s111g1p04(), '111_1004')
    generate(s111g1p05(), '111_1005')
    generate(s111g1p06(), '111_1006')
    generate(s111g1p07(), '111_1007')


#cq = 150
#generate(s111g1p01(), '111_1001') 
 
************************************************/
